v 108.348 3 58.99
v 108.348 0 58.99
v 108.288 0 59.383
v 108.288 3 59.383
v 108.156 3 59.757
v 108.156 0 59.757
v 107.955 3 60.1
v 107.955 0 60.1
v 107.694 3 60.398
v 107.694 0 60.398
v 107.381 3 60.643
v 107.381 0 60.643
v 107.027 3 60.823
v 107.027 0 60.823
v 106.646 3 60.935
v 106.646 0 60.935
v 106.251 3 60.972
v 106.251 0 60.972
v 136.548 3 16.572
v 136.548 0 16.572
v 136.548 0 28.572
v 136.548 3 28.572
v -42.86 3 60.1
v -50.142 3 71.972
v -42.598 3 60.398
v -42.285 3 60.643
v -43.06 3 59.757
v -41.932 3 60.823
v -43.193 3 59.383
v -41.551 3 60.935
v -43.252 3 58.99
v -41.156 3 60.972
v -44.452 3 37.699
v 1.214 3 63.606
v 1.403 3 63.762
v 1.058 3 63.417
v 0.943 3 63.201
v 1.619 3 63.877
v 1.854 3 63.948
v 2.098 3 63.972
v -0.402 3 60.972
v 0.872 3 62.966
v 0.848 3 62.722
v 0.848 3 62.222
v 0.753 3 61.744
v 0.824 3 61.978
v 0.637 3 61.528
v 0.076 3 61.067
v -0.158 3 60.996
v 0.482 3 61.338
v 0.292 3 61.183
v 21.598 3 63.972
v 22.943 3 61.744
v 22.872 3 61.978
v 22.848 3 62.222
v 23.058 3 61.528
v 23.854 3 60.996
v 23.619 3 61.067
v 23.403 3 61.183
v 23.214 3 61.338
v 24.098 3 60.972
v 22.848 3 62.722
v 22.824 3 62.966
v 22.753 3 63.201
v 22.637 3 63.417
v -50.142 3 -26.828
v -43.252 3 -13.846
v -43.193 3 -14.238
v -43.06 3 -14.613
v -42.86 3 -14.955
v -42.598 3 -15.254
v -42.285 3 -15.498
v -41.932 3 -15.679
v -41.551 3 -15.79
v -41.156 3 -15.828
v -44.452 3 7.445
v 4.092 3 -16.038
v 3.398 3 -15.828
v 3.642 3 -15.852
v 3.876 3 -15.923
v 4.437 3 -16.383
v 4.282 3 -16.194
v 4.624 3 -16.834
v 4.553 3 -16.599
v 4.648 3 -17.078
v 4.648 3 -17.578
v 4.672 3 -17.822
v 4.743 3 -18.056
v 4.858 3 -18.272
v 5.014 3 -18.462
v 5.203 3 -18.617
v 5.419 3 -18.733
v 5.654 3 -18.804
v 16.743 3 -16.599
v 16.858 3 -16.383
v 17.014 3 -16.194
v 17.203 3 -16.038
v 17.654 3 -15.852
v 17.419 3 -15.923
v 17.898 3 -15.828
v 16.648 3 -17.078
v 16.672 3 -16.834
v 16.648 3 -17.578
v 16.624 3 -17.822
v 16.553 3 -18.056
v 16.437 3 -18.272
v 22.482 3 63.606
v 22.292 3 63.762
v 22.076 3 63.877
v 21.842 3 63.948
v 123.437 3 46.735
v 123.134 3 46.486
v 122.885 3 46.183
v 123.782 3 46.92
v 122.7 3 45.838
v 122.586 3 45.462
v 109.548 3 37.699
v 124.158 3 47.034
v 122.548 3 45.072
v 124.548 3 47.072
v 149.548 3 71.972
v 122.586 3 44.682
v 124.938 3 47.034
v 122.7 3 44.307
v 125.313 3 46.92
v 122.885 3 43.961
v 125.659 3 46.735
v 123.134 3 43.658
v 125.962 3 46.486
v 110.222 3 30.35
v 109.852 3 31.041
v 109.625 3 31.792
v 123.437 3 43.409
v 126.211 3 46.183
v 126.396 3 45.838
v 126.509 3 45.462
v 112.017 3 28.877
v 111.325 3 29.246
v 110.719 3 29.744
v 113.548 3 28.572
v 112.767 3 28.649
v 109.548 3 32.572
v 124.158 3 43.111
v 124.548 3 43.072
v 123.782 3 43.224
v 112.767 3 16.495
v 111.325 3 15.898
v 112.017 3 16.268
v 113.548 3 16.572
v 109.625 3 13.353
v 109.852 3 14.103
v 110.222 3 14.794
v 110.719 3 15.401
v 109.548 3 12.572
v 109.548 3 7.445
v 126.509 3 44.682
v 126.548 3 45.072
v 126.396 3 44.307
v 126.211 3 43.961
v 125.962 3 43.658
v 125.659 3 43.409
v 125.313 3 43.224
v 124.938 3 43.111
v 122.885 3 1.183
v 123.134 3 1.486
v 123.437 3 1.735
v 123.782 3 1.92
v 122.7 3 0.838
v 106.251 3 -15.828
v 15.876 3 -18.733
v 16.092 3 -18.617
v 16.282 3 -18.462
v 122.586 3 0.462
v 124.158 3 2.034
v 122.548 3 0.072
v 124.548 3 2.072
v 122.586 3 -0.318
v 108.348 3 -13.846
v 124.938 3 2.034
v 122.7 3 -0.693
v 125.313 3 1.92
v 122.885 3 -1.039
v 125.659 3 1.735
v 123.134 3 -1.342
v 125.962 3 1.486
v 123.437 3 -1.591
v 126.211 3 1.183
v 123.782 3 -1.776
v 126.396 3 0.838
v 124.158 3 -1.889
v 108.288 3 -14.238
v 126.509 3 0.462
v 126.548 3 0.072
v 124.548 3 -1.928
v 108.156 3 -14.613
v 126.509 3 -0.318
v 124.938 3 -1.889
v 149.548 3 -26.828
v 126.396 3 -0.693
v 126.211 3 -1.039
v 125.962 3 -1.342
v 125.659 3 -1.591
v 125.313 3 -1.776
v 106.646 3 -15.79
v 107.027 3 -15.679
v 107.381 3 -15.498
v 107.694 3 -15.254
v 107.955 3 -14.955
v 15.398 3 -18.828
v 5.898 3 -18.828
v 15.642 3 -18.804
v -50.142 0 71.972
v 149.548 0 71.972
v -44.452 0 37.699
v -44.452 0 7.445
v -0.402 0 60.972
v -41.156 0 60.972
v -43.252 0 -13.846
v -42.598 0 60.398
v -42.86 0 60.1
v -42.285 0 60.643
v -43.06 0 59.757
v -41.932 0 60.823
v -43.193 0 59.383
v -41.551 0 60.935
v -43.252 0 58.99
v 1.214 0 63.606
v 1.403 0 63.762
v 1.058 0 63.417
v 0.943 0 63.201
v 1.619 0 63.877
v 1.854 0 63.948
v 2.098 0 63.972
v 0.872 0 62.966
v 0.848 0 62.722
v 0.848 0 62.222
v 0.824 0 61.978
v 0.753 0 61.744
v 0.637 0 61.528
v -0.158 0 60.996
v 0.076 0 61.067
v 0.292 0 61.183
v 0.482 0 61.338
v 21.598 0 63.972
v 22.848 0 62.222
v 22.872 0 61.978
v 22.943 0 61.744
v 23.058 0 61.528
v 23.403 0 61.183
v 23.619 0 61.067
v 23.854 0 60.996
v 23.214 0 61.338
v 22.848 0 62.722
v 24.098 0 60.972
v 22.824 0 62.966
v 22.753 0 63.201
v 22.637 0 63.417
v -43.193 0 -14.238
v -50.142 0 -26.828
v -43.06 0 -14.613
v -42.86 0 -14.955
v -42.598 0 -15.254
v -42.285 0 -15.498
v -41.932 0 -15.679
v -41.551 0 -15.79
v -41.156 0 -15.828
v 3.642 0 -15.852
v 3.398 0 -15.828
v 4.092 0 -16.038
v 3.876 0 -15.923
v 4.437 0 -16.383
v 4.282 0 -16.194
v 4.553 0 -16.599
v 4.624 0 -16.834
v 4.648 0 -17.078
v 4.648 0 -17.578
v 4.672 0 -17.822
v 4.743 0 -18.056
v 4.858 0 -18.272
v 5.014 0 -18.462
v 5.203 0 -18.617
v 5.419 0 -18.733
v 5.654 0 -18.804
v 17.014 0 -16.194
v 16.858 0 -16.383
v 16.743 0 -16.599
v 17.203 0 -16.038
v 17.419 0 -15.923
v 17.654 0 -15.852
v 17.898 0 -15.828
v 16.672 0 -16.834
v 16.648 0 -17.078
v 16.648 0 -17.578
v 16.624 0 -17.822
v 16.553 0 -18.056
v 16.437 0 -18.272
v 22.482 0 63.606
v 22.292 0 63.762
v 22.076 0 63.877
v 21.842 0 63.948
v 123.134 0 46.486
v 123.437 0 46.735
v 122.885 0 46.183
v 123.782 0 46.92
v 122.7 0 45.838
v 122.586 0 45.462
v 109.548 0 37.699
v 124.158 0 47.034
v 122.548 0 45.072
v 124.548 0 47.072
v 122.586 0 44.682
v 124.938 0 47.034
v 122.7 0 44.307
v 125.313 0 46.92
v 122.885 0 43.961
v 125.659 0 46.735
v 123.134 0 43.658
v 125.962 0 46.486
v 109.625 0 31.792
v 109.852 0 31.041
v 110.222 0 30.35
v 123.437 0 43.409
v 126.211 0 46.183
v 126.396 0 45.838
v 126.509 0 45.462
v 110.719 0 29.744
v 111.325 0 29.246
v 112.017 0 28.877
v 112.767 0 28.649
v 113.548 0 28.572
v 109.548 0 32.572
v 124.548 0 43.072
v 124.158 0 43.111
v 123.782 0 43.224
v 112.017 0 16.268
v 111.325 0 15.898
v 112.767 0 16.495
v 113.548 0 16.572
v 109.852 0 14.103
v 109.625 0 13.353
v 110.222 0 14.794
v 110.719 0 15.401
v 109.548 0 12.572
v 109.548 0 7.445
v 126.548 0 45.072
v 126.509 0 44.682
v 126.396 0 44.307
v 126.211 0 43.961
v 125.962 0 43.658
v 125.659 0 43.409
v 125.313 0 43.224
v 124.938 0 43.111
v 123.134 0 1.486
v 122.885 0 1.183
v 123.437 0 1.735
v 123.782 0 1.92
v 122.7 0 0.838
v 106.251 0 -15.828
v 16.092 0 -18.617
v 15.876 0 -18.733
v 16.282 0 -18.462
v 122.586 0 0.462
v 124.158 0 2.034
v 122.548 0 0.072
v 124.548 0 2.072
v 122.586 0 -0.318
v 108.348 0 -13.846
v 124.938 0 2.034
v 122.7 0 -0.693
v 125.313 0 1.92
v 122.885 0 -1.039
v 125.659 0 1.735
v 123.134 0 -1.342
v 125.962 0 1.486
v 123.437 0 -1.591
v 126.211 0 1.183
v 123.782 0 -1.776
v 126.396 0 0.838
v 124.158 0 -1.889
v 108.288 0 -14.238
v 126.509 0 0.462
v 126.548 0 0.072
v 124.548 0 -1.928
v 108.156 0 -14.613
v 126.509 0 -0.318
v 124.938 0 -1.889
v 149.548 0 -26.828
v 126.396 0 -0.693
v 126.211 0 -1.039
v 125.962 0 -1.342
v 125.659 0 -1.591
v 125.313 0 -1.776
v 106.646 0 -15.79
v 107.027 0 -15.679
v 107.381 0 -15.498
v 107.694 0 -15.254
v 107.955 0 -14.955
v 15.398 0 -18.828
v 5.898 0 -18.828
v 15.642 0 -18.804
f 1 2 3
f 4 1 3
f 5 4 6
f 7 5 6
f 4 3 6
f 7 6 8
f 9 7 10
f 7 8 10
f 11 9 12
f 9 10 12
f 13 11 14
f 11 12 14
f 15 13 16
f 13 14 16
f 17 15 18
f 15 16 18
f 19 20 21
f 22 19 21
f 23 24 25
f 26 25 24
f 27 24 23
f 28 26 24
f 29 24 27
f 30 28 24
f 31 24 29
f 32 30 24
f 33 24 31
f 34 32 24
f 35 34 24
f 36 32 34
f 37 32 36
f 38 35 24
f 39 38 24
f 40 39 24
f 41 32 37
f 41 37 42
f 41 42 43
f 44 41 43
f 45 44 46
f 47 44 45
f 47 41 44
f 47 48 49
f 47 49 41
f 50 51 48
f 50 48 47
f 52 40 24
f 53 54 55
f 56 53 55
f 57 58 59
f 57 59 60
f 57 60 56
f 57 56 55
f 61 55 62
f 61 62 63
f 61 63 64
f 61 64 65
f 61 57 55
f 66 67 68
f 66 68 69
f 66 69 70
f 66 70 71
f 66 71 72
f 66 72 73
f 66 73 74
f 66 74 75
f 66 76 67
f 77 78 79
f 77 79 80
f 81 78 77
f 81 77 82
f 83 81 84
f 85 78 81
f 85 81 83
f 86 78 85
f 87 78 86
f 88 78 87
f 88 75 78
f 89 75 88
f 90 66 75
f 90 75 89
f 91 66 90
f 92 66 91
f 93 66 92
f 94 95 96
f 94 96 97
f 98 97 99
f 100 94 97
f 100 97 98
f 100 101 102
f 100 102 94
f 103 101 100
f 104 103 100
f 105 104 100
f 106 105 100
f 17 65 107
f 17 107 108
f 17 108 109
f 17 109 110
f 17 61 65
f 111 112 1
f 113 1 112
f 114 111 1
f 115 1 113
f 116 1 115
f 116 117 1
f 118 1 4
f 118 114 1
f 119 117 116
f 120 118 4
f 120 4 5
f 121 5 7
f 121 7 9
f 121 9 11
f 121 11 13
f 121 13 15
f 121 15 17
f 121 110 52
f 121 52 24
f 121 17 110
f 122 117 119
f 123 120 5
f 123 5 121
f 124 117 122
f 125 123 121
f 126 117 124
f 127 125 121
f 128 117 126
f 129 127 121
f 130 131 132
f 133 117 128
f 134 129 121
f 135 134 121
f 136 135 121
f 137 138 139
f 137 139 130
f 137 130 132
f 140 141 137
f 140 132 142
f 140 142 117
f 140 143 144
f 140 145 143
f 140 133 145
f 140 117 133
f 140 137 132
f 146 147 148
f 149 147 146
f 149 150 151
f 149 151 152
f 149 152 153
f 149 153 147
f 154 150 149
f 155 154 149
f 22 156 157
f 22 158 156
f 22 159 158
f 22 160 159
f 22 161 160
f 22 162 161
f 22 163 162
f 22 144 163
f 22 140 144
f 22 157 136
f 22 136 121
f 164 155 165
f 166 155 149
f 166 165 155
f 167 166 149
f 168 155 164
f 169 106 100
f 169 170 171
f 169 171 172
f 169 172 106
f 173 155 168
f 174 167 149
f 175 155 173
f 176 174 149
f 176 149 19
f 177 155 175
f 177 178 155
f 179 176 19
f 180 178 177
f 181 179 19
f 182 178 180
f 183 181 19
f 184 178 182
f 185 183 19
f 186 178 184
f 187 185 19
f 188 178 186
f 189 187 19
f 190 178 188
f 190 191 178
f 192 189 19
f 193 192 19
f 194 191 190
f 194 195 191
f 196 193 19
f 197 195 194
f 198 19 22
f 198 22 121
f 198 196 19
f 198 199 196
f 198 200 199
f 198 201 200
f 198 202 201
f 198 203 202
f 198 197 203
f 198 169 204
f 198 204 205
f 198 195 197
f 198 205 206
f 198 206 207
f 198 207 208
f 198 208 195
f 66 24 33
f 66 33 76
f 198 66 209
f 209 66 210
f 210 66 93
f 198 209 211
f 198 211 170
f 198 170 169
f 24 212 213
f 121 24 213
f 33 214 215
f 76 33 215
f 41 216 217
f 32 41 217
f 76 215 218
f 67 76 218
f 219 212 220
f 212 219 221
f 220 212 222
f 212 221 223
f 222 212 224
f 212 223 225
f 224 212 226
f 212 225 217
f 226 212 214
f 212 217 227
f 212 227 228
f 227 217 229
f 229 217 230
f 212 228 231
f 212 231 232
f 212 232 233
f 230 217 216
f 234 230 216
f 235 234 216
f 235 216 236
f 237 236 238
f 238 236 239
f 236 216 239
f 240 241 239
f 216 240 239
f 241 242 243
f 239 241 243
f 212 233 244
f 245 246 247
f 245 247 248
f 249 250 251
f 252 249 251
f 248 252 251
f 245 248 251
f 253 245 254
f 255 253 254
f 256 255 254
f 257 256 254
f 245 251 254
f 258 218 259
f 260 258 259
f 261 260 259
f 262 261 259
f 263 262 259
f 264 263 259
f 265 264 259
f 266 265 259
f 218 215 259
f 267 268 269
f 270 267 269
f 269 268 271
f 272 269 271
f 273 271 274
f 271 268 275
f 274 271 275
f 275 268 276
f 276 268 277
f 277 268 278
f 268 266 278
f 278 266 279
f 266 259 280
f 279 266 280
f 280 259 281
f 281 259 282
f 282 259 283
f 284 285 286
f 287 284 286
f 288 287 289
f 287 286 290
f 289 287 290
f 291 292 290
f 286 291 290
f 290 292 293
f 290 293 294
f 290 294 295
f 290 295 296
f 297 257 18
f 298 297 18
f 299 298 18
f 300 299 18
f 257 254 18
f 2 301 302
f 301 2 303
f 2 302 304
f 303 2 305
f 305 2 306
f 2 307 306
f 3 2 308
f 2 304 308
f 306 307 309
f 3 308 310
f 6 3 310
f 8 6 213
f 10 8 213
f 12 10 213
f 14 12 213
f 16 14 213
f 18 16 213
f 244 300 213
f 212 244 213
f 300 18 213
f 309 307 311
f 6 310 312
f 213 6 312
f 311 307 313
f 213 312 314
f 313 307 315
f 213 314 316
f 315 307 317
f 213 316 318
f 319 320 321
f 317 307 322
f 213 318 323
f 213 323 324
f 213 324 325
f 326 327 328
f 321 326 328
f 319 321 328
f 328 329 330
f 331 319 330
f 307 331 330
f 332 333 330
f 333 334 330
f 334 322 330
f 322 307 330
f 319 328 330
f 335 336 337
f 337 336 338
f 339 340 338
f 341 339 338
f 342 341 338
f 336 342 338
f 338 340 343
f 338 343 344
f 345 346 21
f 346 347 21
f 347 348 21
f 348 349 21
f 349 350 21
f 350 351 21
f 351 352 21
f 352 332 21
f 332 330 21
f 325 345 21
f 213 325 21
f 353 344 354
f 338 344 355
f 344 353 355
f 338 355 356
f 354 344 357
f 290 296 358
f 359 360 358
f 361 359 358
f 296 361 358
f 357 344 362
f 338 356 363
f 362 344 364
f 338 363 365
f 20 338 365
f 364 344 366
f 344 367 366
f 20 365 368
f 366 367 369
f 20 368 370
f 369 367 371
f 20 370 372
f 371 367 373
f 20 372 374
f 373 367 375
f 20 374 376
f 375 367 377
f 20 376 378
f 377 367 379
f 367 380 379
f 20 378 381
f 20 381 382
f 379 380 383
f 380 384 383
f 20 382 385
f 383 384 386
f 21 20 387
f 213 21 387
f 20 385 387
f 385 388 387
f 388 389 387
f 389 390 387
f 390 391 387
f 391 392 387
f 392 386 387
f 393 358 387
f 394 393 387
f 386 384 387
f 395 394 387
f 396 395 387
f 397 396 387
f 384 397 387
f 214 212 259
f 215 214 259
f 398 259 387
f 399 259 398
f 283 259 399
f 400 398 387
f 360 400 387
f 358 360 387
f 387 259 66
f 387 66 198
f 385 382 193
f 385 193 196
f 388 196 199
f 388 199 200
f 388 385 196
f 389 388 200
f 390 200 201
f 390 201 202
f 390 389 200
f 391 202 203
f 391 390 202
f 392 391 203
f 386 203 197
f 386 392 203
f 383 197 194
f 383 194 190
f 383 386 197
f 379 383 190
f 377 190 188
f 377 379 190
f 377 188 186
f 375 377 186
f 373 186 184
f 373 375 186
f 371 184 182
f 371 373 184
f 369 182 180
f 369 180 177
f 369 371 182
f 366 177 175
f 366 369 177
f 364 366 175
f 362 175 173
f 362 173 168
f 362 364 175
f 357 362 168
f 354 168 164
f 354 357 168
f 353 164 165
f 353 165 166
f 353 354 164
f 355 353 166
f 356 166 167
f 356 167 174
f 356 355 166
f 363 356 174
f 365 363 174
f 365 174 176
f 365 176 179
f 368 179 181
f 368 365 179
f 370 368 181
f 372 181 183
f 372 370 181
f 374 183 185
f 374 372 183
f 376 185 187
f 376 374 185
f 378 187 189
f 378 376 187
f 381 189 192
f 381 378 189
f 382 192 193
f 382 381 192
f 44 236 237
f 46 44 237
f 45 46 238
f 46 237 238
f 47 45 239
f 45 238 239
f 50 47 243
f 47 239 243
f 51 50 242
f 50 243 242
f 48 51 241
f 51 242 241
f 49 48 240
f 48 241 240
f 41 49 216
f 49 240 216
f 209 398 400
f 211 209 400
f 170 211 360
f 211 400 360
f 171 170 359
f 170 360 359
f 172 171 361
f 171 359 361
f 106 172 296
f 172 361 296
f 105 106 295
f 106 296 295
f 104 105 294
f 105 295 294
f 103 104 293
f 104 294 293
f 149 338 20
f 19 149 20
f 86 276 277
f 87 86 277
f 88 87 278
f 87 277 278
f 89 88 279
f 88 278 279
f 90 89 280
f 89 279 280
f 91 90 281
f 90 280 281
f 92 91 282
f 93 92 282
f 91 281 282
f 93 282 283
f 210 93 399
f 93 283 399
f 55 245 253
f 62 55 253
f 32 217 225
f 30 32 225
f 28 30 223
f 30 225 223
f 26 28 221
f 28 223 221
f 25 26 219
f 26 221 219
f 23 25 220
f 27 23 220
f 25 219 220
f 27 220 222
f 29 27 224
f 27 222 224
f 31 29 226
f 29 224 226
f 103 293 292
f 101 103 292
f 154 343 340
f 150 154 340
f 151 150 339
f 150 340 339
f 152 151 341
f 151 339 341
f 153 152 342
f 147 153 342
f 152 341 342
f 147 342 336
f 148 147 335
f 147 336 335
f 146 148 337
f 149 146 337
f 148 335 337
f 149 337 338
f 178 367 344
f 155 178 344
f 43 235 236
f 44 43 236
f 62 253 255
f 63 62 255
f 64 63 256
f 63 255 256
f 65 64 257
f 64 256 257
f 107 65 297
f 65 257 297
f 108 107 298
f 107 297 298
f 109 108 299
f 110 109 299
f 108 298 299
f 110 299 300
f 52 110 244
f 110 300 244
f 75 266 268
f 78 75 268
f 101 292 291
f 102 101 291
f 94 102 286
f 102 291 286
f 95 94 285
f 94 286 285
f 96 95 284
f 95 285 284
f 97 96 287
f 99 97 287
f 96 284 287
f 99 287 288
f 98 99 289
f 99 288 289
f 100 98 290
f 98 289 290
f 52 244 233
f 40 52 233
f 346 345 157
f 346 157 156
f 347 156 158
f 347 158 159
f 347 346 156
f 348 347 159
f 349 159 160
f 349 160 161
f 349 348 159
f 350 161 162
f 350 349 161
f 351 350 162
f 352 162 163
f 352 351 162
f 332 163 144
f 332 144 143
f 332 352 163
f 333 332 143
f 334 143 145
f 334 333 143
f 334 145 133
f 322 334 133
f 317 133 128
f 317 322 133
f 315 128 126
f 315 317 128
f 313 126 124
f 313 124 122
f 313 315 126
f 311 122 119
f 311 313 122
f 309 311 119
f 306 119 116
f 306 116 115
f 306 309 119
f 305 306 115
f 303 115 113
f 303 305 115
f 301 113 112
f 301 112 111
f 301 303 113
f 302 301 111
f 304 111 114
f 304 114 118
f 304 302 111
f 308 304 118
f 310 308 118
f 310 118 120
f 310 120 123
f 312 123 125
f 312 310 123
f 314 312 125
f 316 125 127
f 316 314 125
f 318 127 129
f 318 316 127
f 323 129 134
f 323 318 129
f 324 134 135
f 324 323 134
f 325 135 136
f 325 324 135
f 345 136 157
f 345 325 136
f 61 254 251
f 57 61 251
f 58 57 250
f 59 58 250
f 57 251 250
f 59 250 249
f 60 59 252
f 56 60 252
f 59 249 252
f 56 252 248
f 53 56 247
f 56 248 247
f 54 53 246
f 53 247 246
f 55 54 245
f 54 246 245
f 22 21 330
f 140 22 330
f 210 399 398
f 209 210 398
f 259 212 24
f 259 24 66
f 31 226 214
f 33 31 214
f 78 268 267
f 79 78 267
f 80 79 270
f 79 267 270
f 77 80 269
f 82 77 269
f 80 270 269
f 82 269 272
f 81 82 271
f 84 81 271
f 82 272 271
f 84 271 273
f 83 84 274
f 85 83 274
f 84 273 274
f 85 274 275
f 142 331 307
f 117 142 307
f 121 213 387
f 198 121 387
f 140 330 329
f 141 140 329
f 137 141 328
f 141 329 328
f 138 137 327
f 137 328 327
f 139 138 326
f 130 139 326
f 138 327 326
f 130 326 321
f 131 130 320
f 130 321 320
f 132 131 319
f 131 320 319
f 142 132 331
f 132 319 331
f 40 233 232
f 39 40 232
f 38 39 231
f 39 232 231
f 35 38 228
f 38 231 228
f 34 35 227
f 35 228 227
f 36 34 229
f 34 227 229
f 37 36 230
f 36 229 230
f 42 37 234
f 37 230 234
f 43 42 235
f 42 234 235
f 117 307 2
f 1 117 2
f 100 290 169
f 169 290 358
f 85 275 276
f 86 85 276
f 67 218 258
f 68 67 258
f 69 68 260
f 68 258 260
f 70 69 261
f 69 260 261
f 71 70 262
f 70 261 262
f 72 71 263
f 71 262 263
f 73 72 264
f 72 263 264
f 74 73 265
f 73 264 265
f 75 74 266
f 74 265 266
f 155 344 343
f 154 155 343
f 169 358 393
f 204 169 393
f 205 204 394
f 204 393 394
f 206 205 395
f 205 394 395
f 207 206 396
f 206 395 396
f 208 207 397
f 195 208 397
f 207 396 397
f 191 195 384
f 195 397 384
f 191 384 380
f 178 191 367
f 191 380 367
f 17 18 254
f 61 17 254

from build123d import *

# Parameters (mm, degrees)
SKETCH1_W           = 199.69
SKETCH1_H           = 98.8
SKETCH1_R           = 2
BOSS_EXTRUDE1_DEPTH = 3


with BuildPart() as part:
    # Sketch1 → Boss-Extrude1 (new body)
    with BuildSketch(Plane(origin=(0, 0, 0), x_dir=(1, 0, 0), z_dir=(0, 1, 0))):
        with Locations((49.702752105, -22.572203273)):
            Rectangle(SKETCH1_W, SKETCH1_H)
        with Locations((124.547752105, -0.072203273)):
            Circle(SKETCH1_R, mode=Mode.SUBTRACT)
        with Locations((124.547752105, -45.072203273)):
            Circle(SKETCH1_R, mode=Mode.SUBTRACT)
        with BuildLine():
            Line((-41.155575491, 15.827796727), (3.397752105, 15.827796727))
            ThreePointArc((3.397752105, 15.827796727), (4.281635581, 16.193913251), (4.647752105, 17.077796727))
            Line((4.647752105, 17.077796727), (4.647752105, 17.577796727))
            ThreePointArc((4.647752105, 17.577796727), (5.013868628, 18.461680204), (5.897752105, 18.827796727))
            Line((5.897752105, 18.827796727), (15.397752105, 18.827796727))
            ThreePointArc((15.397752105, 18.827796727), (16.281635581, 18.461680204), (16.647752105, 17.577796727))
            Line((16.647752105, 17.577796727), (16.647752105, 17.077796727))
            ThreePointArc((16.647752105, 17.077796727), (17.013868628, 16.193913251), (17.897752105, 15.827796727))
            Line((17.897752105, 15.827796727), (106.2510797, 15.827796727))
            ThreePointArc((106.2510797, 15.827796727), (107.693618601, 15.253929592), (108.347752105, 13.845969603))
            Line((108.347752105, 13.845969603), (109.547752105, -7.444930545))
            Line((109.547752105, -7.444930545), (109.547752105, -12.572203273))
            ThreePointArc((109.547752105, -12.572203273), (110.71932498, -15.400630397), (113.547752105, -16.572203273))
            Line((113.547752105, -16.572203273), (136.547694997, -16.572203273))
            Line((136.547694997, -16.572203273), (136.547694997, -28.572203273))
            Line((136.547694997, -28.572203273), (113.547752105, -28.572203273))
            ThreePointArc((113.547752105, -28.572203273), (110.71932498, -29.743776148), (109.547752105, -32.572203273))
            Line((109.547752105, -32.572203273), (109.547752105, -37.699476))
            Line((109.547752105, -37.699476), (108.347752105, -58.990376148))
            ThreePointArc((108.347752105, -58.990376148), (107.693618601, -60.398336137), (106.2510797, -60.972203273))
            Line((106.2510797, -60.972203273), (24.097694997, -60.972203273))
            ThreePointArc((24.097694997, -60.972203273), (23.21381152, -61.338319796), (22.847694997, -62.222203273))
            Line((22.847694997, -62.222203273), (22.847694997, -62.722203273))
            ThreePointArc((22.847694997, -62.722203273), (22.481578473, -63.606086749), (21.597694997, -63.972203273))
            Line((21.597694997, -63.972203273), (2.097694997, -63.972203273))
            ThreePointArc((2.097694997, -63.972203273), (1.21381152, -63.606086749), (0.847694997, -62.722203273))
            Line((0.847694997, -62.722203273), (0.847694997, -62.222203273))
            ThreePointArc((0.847694997, -62.222203273), (0.481578473, -61.338319796), (-0.402305003, -60.972203273))
            Line((-0.402305003, -60.972203273), (-41.155575491, -60.972203273))
            ThreePointArc((-41.155575491, -60.972203273), (-42.598114392, -60.398336137), (-43.252247895, -58.990376148))
            Line((-43.252247895, -58.990376148), (-44.452247895, -37.699476))
            Line((-44.452247895, -37.699476), (-44.452247895, -7.444930545))
            Line((-44.452247895, -7.444930545), (-43.252247895, 13.845969603))
            ThreePointArc((-43.252247895, 13.845969603), (-42.598114392, 15.253929592), (-41.155575491, 15.827796727))
        make_face(mode=Mode.SUBTRACT)
    extrude(amount=BOSS_EXTRUDE1_DEPTH)


solid = part.part
